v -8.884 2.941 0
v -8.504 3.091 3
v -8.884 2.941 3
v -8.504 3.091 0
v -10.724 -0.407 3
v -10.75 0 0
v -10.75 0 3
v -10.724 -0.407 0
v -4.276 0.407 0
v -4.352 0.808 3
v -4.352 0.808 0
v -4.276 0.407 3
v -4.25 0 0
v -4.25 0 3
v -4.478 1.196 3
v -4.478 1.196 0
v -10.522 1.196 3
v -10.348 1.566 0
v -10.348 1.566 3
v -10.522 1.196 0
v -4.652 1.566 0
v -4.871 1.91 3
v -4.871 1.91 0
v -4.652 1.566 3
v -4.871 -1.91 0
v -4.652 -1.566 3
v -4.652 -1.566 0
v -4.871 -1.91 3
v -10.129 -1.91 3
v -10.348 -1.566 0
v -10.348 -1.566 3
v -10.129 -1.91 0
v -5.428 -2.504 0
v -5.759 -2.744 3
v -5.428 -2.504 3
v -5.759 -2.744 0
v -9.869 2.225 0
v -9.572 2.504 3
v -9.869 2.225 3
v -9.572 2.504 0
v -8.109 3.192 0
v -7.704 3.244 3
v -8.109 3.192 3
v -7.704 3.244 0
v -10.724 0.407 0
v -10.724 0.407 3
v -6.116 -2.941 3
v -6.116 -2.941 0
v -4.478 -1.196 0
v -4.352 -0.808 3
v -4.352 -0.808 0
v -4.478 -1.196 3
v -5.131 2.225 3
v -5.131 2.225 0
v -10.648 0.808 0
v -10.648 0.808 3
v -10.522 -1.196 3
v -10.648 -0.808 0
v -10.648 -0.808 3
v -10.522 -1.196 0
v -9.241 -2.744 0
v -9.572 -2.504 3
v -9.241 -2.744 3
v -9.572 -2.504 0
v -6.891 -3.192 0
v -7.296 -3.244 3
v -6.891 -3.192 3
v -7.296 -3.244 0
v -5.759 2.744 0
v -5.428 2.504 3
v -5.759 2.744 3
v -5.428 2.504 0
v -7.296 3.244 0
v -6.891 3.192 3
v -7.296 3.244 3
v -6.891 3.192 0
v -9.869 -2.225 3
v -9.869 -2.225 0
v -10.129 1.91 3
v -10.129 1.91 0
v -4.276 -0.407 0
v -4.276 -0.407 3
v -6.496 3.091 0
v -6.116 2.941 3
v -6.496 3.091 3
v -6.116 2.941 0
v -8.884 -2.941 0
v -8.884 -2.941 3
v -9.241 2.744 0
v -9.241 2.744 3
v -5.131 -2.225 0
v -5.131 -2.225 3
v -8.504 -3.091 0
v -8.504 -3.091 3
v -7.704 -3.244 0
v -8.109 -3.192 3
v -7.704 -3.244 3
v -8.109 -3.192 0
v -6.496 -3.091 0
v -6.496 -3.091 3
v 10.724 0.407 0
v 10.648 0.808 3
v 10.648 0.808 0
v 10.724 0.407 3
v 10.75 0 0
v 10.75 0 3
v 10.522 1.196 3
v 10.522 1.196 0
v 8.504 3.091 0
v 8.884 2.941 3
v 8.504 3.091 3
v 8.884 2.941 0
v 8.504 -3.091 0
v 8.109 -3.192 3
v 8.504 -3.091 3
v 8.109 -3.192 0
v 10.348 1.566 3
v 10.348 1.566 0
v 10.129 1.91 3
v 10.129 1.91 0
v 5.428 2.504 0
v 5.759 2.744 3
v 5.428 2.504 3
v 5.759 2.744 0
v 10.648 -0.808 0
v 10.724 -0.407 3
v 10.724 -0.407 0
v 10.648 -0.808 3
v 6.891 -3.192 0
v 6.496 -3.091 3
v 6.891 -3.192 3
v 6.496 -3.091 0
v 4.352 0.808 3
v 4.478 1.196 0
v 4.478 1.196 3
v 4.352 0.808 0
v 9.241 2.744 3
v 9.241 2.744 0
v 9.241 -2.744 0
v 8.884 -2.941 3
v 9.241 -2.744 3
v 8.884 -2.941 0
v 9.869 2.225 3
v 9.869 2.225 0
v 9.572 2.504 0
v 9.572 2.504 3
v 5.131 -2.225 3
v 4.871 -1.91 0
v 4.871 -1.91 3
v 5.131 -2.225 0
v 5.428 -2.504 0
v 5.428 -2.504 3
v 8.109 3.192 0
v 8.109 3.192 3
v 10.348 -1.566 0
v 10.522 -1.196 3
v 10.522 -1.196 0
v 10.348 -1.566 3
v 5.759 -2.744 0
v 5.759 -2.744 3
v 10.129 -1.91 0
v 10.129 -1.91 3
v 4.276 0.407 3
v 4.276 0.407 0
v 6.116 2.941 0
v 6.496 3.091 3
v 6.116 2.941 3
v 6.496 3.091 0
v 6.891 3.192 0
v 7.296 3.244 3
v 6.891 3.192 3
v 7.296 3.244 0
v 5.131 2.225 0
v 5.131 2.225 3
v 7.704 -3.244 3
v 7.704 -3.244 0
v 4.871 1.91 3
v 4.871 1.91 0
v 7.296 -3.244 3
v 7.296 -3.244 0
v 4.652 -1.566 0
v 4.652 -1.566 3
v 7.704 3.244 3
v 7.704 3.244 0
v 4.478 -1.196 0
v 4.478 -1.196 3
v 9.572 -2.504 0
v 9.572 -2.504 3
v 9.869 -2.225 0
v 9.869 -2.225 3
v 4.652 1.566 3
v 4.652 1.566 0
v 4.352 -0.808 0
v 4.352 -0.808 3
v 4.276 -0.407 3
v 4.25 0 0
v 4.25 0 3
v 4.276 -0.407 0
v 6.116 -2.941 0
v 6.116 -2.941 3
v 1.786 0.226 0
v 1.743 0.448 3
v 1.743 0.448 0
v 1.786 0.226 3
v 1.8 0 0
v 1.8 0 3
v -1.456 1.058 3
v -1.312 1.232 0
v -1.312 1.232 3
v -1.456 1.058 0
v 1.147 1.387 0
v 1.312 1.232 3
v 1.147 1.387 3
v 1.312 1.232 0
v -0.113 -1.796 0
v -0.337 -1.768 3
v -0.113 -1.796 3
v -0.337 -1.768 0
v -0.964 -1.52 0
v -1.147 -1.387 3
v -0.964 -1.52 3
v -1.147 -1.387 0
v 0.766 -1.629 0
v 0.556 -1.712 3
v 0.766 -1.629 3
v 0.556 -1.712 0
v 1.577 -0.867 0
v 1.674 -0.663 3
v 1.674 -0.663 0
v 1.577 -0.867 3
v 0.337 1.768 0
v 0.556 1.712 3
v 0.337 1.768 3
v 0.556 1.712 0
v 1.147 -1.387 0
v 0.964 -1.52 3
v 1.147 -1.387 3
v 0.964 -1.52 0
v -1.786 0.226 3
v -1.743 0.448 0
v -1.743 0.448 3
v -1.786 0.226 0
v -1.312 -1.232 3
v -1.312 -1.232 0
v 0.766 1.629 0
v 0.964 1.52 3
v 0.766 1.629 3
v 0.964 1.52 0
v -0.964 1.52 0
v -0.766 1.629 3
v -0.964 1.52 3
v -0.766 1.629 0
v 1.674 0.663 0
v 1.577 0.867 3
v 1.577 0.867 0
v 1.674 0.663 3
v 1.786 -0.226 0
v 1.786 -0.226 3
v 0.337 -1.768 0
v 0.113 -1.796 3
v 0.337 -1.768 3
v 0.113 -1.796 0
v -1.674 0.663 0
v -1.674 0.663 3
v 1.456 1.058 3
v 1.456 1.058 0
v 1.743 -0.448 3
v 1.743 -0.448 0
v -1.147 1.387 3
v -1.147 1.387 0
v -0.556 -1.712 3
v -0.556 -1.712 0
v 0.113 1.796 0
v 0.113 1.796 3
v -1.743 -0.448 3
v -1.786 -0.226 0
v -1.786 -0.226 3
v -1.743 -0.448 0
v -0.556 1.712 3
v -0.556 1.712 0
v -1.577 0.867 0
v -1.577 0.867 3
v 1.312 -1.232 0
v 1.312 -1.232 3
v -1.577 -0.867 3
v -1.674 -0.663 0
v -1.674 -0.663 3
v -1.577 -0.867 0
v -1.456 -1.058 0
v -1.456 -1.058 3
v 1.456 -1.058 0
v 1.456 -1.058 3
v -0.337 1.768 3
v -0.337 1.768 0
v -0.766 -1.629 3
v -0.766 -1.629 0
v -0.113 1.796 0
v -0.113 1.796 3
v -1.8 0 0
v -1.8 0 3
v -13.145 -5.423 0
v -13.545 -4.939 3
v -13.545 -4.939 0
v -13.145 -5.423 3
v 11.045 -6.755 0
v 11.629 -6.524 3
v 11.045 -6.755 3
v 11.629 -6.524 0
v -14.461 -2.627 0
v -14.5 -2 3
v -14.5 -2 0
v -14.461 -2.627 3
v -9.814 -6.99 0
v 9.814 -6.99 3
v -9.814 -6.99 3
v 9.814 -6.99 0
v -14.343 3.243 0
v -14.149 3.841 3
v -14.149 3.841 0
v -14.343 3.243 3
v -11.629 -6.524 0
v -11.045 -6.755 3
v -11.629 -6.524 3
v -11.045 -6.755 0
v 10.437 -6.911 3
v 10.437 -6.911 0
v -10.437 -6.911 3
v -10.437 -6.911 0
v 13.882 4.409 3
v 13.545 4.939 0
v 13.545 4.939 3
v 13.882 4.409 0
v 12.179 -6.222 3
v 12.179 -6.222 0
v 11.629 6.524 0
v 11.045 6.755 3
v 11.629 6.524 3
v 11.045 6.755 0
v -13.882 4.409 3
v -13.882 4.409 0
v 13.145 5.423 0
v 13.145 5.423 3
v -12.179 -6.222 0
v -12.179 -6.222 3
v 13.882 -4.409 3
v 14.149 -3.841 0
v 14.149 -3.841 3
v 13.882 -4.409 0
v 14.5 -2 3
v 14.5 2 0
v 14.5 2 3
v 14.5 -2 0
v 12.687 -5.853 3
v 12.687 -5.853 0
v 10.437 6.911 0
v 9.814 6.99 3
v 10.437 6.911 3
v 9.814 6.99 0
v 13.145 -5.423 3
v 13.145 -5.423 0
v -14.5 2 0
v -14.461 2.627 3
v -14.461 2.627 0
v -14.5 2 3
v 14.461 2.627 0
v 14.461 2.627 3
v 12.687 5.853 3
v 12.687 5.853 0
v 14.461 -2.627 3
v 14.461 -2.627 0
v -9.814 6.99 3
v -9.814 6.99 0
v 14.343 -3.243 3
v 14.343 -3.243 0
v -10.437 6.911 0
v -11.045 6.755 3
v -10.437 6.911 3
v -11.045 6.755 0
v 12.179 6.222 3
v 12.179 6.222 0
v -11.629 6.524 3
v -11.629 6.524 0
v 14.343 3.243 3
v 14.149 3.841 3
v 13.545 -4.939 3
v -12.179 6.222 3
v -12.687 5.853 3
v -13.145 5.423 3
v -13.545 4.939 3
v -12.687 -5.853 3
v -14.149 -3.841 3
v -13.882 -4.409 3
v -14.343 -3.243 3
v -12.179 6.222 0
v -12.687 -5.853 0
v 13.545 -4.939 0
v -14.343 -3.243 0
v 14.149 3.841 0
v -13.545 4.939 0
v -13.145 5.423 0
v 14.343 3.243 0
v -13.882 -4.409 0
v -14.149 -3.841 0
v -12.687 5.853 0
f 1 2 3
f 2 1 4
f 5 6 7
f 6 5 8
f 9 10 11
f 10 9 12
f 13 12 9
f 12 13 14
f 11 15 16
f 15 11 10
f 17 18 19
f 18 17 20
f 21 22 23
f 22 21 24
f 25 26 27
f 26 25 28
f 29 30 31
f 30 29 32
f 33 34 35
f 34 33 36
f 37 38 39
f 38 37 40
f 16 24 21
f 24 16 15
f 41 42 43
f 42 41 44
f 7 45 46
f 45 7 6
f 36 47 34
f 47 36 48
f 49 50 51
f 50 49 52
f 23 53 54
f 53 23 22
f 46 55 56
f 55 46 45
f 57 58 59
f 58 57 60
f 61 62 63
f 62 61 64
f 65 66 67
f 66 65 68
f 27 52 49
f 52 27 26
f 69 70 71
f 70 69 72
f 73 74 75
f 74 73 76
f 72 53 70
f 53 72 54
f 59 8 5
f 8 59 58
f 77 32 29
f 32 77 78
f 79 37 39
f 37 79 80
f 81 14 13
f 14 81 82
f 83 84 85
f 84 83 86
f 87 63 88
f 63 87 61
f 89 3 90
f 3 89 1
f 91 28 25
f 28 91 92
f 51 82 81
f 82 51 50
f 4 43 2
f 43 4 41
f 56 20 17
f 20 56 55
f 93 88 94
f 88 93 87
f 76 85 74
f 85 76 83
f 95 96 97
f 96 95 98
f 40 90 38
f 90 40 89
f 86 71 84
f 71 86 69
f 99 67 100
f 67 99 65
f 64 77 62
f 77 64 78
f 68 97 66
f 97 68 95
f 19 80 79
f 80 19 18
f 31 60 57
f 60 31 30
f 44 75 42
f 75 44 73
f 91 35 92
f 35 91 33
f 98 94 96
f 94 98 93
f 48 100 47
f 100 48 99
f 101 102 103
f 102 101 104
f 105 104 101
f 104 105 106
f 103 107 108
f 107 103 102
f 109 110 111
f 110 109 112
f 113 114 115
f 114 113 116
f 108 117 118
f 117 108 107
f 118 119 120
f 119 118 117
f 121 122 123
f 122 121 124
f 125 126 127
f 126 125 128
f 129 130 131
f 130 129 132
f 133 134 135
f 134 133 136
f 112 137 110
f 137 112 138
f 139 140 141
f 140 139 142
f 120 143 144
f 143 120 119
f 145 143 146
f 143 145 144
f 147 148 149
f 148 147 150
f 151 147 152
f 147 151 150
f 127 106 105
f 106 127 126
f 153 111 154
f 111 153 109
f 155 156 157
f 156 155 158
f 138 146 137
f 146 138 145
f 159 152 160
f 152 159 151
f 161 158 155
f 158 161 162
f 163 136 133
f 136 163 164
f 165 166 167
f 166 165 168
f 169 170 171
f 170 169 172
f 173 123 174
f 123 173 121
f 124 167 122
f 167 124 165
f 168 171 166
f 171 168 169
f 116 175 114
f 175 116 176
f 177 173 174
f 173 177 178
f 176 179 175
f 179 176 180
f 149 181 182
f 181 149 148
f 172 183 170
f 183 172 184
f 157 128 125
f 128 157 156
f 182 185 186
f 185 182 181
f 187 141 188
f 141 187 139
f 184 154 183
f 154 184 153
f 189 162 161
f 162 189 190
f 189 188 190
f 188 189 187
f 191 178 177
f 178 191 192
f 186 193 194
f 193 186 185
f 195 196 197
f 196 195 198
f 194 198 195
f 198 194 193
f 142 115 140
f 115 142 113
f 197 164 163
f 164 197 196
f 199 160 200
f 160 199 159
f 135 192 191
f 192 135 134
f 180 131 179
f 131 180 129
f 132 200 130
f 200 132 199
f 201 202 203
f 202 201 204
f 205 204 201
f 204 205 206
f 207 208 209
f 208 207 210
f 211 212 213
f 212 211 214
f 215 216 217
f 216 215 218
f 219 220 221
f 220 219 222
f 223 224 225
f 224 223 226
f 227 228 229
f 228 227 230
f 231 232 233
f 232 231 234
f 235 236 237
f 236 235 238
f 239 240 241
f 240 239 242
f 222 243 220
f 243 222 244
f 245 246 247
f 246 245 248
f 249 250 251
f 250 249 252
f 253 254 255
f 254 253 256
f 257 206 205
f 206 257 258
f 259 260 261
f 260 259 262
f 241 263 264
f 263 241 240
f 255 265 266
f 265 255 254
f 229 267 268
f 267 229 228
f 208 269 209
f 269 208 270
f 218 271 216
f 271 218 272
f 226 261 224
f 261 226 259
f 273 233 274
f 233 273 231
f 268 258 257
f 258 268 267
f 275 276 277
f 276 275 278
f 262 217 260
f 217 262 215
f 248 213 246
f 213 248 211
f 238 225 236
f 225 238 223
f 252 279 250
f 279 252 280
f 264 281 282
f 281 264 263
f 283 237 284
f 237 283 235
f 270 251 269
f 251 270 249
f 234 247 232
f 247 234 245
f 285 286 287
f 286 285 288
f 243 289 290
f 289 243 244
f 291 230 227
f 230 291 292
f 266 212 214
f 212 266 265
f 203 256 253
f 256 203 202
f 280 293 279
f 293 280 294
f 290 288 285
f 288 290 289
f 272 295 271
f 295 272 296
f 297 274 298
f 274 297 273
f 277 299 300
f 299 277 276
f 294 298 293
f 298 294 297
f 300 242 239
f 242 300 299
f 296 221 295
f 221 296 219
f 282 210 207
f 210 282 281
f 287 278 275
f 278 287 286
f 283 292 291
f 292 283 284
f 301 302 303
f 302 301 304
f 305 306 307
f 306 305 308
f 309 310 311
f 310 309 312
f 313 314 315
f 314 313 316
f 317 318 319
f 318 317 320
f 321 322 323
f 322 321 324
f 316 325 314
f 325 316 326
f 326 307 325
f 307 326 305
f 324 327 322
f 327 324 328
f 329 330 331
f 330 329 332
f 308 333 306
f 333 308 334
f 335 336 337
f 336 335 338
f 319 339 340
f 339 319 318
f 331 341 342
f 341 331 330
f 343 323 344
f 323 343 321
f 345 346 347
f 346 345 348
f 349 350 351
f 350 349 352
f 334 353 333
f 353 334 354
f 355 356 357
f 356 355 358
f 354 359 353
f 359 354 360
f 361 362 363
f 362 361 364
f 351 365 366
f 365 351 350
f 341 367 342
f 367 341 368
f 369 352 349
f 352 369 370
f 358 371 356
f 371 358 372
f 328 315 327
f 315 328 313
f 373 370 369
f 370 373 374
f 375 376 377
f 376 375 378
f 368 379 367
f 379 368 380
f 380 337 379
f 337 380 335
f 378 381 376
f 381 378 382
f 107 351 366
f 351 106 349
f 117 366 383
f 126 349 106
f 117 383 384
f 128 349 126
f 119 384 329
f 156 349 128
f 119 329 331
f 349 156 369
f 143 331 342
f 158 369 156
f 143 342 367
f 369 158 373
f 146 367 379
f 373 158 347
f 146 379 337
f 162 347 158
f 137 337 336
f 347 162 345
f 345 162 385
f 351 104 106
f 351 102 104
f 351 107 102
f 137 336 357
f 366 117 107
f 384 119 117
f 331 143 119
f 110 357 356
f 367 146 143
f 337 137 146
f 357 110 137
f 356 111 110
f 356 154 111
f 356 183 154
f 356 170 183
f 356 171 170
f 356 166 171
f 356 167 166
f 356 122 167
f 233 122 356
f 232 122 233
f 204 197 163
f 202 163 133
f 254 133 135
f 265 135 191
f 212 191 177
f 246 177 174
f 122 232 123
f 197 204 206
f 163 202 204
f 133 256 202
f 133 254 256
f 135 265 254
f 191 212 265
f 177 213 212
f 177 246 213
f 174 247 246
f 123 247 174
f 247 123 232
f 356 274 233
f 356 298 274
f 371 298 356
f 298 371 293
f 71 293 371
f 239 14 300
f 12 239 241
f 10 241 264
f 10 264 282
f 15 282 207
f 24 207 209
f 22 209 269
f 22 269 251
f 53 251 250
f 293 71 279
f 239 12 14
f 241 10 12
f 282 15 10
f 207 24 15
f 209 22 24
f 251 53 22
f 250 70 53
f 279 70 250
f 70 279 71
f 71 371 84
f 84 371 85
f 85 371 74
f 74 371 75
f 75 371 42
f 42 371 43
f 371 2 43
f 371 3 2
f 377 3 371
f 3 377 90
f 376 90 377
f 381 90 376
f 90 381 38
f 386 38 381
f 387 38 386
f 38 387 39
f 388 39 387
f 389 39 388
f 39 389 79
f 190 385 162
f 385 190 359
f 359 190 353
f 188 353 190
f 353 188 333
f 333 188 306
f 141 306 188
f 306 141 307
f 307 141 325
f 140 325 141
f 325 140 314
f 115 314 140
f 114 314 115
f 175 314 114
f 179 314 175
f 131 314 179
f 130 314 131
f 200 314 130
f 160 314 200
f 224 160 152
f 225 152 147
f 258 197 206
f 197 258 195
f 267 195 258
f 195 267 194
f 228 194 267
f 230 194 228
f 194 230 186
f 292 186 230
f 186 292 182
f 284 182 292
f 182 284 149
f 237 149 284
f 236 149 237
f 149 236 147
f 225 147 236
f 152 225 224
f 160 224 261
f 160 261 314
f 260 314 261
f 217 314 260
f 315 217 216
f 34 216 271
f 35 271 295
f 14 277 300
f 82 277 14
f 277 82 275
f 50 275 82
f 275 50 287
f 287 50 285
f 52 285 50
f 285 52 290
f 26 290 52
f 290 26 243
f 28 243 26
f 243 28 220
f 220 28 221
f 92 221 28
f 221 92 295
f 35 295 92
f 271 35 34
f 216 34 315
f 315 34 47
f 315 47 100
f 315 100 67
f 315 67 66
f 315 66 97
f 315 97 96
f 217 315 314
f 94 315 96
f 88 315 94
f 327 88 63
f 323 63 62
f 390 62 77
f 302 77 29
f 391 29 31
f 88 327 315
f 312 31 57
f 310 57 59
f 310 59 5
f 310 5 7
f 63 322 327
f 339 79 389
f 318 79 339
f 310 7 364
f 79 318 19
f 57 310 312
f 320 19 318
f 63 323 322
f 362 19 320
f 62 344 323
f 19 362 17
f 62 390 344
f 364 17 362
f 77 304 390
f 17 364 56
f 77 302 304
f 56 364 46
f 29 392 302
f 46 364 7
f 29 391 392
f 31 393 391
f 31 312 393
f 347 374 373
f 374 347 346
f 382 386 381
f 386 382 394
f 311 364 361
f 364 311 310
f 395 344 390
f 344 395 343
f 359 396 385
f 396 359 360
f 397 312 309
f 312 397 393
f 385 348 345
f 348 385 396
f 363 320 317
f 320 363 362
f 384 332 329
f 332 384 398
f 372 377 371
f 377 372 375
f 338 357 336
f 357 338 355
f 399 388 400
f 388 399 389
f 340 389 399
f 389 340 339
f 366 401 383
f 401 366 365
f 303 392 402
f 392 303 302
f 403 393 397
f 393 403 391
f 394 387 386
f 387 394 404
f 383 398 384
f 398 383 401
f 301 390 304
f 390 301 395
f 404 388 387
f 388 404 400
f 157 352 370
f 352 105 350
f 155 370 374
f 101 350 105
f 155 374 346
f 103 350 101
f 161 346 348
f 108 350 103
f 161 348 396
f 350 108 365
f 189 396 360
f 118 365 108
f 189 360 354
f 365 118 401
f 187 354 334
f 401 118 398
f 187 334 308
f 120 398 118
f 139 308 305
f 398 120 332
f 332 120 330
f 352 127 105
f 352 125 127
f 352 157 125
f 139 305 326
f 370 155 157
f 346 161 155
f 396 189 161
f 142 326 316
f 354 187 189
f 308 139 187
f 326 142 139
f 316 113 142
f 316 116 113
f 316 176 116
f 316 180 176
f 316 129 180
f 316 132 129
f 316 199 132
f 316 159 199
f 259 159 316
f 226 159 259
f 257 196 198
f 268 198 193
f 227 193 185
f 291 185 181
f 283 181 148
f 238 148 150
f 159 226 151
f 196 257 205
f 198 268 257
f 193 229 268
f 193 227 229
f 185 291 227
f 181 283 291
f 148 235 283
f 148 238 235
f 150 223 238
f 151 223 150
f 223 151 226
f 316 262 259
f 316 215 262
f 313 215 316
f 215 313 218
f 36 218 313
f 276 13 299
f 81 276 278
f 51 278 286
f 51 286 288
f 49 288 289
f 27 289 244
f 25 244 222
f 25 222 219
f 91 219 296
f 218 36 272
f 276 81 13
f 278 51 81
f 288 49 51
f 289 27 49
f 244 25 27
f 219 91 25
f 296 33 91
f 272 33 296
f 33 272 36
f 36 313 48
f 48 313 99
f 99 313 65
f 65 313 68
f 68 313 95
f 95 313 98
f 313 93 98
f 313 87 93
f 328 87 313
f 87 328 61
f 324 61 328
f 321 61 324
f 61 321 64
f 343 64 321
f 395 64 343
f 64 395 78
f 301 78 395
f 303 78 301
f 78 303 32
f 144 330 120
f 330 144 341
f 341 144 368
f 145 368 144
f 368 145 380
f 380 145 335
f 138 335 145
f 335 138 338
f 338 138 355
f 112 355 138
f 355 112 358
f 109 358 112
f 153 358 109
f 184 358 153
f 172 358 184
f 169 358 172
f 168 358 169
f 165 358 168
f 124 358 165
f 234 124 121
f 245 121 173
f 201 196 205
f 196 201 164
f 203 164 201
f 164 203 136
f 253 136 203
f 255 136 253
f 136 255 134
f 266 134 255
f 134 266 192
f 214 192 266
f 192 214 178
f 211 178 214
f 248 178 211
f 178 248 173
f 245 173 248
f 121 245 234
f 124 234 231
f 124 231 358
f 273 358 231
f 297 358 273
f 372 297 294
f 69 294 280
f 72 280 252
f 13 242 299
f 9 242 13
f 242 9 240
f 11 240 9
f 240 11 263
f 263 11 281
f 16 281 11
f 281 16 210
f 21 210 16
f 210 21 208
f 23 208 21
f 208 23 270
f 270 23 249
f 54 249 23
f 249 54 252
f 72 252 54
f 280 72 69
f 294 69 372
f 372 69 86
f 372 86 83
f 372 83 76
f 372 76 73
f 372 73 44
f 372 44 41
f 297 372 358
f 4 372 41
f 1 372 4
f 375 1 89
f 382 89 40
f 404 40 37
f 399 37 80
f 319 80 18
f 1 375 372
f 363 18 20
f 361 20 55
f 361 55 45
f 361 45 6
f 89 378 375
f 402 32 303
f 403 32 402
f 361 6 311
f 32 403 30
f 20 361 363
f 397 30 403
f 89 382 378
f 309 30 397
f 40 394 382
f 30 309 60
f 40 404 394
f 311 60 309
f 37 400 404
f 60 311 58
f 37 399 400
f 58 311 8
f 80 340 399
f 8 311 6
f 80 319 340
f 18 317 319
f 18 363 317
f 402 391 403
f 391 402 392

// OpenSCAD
$fn = 50;


difference() {
	union() {
		*color(alpha = 1.0000000000, c = "gray") {
			translate(v = [0, 7, 0]) {
				linear_extrude(height = 1) {
					text(font = "Arial:style=Bold", halign = "center", size = 4.5000000000, text = "COMMENT plate main", valign = "center");
				}
			}
		}
		hull() {
			translate(v = [-9.5000000000, 2.0000000000, 0]) {
				cylinder(h = 3, r = 5);
			}
			translate(v = [9.5000000000, 2.0000000000, 0]) {
				cylinder(h = 3, r = 5);
			}
			translate(v = [-9.5000000000, -2.0000000000, 0]) {
				cylinder(h = 3, r = 5);
			}
			translate(v = [9.5000000000, -2.0000000000, 0]) {
				cylinder(h = 3, r = 5);
			}
		}
	}
	union() {
		*color(alpha = 1.0000000000, c = "gray") {
			translate(v = [0, 7, 0]) {
				linear_extrude(height = 1) {
					text(font = "Arial:style=Bold", halign = "center", size = 4.5000000000, text = "COMMENT holes main", valign = "center");
				}
			}
		}
		translate(v = [-7.5000000000, 0.0000000000, 0]) {
			translate(v = [0, 0, -100]) {
				cylinder(h = 200, r = 3.2500000000);
			}
		}
		translate(v = [7.5000000000, 0.0000000000, 0]) {
			translate(v = [0, 0, -100]) {
				cylinder(h = 200, r = 3.2500000000);
			}
		}
		translate(v = [-7.5000000000, 0.0000000000, 0]) {
			translate(v = [0, 0, -100]) {
				cylinder(h = 200, r = 1.8000000000);
			}
		}
		translate(v = [0, 0, -100]) {
			cylinder(h = 200, r = 1.8000000000);
		}
		translate(v = [7.5000000000, 0.0000000000, 0]) {
			translate(v = [0, 0, -100]) {
				cylinder(h = 200, r = 1.8000000000);
			}
		}
	}
}
